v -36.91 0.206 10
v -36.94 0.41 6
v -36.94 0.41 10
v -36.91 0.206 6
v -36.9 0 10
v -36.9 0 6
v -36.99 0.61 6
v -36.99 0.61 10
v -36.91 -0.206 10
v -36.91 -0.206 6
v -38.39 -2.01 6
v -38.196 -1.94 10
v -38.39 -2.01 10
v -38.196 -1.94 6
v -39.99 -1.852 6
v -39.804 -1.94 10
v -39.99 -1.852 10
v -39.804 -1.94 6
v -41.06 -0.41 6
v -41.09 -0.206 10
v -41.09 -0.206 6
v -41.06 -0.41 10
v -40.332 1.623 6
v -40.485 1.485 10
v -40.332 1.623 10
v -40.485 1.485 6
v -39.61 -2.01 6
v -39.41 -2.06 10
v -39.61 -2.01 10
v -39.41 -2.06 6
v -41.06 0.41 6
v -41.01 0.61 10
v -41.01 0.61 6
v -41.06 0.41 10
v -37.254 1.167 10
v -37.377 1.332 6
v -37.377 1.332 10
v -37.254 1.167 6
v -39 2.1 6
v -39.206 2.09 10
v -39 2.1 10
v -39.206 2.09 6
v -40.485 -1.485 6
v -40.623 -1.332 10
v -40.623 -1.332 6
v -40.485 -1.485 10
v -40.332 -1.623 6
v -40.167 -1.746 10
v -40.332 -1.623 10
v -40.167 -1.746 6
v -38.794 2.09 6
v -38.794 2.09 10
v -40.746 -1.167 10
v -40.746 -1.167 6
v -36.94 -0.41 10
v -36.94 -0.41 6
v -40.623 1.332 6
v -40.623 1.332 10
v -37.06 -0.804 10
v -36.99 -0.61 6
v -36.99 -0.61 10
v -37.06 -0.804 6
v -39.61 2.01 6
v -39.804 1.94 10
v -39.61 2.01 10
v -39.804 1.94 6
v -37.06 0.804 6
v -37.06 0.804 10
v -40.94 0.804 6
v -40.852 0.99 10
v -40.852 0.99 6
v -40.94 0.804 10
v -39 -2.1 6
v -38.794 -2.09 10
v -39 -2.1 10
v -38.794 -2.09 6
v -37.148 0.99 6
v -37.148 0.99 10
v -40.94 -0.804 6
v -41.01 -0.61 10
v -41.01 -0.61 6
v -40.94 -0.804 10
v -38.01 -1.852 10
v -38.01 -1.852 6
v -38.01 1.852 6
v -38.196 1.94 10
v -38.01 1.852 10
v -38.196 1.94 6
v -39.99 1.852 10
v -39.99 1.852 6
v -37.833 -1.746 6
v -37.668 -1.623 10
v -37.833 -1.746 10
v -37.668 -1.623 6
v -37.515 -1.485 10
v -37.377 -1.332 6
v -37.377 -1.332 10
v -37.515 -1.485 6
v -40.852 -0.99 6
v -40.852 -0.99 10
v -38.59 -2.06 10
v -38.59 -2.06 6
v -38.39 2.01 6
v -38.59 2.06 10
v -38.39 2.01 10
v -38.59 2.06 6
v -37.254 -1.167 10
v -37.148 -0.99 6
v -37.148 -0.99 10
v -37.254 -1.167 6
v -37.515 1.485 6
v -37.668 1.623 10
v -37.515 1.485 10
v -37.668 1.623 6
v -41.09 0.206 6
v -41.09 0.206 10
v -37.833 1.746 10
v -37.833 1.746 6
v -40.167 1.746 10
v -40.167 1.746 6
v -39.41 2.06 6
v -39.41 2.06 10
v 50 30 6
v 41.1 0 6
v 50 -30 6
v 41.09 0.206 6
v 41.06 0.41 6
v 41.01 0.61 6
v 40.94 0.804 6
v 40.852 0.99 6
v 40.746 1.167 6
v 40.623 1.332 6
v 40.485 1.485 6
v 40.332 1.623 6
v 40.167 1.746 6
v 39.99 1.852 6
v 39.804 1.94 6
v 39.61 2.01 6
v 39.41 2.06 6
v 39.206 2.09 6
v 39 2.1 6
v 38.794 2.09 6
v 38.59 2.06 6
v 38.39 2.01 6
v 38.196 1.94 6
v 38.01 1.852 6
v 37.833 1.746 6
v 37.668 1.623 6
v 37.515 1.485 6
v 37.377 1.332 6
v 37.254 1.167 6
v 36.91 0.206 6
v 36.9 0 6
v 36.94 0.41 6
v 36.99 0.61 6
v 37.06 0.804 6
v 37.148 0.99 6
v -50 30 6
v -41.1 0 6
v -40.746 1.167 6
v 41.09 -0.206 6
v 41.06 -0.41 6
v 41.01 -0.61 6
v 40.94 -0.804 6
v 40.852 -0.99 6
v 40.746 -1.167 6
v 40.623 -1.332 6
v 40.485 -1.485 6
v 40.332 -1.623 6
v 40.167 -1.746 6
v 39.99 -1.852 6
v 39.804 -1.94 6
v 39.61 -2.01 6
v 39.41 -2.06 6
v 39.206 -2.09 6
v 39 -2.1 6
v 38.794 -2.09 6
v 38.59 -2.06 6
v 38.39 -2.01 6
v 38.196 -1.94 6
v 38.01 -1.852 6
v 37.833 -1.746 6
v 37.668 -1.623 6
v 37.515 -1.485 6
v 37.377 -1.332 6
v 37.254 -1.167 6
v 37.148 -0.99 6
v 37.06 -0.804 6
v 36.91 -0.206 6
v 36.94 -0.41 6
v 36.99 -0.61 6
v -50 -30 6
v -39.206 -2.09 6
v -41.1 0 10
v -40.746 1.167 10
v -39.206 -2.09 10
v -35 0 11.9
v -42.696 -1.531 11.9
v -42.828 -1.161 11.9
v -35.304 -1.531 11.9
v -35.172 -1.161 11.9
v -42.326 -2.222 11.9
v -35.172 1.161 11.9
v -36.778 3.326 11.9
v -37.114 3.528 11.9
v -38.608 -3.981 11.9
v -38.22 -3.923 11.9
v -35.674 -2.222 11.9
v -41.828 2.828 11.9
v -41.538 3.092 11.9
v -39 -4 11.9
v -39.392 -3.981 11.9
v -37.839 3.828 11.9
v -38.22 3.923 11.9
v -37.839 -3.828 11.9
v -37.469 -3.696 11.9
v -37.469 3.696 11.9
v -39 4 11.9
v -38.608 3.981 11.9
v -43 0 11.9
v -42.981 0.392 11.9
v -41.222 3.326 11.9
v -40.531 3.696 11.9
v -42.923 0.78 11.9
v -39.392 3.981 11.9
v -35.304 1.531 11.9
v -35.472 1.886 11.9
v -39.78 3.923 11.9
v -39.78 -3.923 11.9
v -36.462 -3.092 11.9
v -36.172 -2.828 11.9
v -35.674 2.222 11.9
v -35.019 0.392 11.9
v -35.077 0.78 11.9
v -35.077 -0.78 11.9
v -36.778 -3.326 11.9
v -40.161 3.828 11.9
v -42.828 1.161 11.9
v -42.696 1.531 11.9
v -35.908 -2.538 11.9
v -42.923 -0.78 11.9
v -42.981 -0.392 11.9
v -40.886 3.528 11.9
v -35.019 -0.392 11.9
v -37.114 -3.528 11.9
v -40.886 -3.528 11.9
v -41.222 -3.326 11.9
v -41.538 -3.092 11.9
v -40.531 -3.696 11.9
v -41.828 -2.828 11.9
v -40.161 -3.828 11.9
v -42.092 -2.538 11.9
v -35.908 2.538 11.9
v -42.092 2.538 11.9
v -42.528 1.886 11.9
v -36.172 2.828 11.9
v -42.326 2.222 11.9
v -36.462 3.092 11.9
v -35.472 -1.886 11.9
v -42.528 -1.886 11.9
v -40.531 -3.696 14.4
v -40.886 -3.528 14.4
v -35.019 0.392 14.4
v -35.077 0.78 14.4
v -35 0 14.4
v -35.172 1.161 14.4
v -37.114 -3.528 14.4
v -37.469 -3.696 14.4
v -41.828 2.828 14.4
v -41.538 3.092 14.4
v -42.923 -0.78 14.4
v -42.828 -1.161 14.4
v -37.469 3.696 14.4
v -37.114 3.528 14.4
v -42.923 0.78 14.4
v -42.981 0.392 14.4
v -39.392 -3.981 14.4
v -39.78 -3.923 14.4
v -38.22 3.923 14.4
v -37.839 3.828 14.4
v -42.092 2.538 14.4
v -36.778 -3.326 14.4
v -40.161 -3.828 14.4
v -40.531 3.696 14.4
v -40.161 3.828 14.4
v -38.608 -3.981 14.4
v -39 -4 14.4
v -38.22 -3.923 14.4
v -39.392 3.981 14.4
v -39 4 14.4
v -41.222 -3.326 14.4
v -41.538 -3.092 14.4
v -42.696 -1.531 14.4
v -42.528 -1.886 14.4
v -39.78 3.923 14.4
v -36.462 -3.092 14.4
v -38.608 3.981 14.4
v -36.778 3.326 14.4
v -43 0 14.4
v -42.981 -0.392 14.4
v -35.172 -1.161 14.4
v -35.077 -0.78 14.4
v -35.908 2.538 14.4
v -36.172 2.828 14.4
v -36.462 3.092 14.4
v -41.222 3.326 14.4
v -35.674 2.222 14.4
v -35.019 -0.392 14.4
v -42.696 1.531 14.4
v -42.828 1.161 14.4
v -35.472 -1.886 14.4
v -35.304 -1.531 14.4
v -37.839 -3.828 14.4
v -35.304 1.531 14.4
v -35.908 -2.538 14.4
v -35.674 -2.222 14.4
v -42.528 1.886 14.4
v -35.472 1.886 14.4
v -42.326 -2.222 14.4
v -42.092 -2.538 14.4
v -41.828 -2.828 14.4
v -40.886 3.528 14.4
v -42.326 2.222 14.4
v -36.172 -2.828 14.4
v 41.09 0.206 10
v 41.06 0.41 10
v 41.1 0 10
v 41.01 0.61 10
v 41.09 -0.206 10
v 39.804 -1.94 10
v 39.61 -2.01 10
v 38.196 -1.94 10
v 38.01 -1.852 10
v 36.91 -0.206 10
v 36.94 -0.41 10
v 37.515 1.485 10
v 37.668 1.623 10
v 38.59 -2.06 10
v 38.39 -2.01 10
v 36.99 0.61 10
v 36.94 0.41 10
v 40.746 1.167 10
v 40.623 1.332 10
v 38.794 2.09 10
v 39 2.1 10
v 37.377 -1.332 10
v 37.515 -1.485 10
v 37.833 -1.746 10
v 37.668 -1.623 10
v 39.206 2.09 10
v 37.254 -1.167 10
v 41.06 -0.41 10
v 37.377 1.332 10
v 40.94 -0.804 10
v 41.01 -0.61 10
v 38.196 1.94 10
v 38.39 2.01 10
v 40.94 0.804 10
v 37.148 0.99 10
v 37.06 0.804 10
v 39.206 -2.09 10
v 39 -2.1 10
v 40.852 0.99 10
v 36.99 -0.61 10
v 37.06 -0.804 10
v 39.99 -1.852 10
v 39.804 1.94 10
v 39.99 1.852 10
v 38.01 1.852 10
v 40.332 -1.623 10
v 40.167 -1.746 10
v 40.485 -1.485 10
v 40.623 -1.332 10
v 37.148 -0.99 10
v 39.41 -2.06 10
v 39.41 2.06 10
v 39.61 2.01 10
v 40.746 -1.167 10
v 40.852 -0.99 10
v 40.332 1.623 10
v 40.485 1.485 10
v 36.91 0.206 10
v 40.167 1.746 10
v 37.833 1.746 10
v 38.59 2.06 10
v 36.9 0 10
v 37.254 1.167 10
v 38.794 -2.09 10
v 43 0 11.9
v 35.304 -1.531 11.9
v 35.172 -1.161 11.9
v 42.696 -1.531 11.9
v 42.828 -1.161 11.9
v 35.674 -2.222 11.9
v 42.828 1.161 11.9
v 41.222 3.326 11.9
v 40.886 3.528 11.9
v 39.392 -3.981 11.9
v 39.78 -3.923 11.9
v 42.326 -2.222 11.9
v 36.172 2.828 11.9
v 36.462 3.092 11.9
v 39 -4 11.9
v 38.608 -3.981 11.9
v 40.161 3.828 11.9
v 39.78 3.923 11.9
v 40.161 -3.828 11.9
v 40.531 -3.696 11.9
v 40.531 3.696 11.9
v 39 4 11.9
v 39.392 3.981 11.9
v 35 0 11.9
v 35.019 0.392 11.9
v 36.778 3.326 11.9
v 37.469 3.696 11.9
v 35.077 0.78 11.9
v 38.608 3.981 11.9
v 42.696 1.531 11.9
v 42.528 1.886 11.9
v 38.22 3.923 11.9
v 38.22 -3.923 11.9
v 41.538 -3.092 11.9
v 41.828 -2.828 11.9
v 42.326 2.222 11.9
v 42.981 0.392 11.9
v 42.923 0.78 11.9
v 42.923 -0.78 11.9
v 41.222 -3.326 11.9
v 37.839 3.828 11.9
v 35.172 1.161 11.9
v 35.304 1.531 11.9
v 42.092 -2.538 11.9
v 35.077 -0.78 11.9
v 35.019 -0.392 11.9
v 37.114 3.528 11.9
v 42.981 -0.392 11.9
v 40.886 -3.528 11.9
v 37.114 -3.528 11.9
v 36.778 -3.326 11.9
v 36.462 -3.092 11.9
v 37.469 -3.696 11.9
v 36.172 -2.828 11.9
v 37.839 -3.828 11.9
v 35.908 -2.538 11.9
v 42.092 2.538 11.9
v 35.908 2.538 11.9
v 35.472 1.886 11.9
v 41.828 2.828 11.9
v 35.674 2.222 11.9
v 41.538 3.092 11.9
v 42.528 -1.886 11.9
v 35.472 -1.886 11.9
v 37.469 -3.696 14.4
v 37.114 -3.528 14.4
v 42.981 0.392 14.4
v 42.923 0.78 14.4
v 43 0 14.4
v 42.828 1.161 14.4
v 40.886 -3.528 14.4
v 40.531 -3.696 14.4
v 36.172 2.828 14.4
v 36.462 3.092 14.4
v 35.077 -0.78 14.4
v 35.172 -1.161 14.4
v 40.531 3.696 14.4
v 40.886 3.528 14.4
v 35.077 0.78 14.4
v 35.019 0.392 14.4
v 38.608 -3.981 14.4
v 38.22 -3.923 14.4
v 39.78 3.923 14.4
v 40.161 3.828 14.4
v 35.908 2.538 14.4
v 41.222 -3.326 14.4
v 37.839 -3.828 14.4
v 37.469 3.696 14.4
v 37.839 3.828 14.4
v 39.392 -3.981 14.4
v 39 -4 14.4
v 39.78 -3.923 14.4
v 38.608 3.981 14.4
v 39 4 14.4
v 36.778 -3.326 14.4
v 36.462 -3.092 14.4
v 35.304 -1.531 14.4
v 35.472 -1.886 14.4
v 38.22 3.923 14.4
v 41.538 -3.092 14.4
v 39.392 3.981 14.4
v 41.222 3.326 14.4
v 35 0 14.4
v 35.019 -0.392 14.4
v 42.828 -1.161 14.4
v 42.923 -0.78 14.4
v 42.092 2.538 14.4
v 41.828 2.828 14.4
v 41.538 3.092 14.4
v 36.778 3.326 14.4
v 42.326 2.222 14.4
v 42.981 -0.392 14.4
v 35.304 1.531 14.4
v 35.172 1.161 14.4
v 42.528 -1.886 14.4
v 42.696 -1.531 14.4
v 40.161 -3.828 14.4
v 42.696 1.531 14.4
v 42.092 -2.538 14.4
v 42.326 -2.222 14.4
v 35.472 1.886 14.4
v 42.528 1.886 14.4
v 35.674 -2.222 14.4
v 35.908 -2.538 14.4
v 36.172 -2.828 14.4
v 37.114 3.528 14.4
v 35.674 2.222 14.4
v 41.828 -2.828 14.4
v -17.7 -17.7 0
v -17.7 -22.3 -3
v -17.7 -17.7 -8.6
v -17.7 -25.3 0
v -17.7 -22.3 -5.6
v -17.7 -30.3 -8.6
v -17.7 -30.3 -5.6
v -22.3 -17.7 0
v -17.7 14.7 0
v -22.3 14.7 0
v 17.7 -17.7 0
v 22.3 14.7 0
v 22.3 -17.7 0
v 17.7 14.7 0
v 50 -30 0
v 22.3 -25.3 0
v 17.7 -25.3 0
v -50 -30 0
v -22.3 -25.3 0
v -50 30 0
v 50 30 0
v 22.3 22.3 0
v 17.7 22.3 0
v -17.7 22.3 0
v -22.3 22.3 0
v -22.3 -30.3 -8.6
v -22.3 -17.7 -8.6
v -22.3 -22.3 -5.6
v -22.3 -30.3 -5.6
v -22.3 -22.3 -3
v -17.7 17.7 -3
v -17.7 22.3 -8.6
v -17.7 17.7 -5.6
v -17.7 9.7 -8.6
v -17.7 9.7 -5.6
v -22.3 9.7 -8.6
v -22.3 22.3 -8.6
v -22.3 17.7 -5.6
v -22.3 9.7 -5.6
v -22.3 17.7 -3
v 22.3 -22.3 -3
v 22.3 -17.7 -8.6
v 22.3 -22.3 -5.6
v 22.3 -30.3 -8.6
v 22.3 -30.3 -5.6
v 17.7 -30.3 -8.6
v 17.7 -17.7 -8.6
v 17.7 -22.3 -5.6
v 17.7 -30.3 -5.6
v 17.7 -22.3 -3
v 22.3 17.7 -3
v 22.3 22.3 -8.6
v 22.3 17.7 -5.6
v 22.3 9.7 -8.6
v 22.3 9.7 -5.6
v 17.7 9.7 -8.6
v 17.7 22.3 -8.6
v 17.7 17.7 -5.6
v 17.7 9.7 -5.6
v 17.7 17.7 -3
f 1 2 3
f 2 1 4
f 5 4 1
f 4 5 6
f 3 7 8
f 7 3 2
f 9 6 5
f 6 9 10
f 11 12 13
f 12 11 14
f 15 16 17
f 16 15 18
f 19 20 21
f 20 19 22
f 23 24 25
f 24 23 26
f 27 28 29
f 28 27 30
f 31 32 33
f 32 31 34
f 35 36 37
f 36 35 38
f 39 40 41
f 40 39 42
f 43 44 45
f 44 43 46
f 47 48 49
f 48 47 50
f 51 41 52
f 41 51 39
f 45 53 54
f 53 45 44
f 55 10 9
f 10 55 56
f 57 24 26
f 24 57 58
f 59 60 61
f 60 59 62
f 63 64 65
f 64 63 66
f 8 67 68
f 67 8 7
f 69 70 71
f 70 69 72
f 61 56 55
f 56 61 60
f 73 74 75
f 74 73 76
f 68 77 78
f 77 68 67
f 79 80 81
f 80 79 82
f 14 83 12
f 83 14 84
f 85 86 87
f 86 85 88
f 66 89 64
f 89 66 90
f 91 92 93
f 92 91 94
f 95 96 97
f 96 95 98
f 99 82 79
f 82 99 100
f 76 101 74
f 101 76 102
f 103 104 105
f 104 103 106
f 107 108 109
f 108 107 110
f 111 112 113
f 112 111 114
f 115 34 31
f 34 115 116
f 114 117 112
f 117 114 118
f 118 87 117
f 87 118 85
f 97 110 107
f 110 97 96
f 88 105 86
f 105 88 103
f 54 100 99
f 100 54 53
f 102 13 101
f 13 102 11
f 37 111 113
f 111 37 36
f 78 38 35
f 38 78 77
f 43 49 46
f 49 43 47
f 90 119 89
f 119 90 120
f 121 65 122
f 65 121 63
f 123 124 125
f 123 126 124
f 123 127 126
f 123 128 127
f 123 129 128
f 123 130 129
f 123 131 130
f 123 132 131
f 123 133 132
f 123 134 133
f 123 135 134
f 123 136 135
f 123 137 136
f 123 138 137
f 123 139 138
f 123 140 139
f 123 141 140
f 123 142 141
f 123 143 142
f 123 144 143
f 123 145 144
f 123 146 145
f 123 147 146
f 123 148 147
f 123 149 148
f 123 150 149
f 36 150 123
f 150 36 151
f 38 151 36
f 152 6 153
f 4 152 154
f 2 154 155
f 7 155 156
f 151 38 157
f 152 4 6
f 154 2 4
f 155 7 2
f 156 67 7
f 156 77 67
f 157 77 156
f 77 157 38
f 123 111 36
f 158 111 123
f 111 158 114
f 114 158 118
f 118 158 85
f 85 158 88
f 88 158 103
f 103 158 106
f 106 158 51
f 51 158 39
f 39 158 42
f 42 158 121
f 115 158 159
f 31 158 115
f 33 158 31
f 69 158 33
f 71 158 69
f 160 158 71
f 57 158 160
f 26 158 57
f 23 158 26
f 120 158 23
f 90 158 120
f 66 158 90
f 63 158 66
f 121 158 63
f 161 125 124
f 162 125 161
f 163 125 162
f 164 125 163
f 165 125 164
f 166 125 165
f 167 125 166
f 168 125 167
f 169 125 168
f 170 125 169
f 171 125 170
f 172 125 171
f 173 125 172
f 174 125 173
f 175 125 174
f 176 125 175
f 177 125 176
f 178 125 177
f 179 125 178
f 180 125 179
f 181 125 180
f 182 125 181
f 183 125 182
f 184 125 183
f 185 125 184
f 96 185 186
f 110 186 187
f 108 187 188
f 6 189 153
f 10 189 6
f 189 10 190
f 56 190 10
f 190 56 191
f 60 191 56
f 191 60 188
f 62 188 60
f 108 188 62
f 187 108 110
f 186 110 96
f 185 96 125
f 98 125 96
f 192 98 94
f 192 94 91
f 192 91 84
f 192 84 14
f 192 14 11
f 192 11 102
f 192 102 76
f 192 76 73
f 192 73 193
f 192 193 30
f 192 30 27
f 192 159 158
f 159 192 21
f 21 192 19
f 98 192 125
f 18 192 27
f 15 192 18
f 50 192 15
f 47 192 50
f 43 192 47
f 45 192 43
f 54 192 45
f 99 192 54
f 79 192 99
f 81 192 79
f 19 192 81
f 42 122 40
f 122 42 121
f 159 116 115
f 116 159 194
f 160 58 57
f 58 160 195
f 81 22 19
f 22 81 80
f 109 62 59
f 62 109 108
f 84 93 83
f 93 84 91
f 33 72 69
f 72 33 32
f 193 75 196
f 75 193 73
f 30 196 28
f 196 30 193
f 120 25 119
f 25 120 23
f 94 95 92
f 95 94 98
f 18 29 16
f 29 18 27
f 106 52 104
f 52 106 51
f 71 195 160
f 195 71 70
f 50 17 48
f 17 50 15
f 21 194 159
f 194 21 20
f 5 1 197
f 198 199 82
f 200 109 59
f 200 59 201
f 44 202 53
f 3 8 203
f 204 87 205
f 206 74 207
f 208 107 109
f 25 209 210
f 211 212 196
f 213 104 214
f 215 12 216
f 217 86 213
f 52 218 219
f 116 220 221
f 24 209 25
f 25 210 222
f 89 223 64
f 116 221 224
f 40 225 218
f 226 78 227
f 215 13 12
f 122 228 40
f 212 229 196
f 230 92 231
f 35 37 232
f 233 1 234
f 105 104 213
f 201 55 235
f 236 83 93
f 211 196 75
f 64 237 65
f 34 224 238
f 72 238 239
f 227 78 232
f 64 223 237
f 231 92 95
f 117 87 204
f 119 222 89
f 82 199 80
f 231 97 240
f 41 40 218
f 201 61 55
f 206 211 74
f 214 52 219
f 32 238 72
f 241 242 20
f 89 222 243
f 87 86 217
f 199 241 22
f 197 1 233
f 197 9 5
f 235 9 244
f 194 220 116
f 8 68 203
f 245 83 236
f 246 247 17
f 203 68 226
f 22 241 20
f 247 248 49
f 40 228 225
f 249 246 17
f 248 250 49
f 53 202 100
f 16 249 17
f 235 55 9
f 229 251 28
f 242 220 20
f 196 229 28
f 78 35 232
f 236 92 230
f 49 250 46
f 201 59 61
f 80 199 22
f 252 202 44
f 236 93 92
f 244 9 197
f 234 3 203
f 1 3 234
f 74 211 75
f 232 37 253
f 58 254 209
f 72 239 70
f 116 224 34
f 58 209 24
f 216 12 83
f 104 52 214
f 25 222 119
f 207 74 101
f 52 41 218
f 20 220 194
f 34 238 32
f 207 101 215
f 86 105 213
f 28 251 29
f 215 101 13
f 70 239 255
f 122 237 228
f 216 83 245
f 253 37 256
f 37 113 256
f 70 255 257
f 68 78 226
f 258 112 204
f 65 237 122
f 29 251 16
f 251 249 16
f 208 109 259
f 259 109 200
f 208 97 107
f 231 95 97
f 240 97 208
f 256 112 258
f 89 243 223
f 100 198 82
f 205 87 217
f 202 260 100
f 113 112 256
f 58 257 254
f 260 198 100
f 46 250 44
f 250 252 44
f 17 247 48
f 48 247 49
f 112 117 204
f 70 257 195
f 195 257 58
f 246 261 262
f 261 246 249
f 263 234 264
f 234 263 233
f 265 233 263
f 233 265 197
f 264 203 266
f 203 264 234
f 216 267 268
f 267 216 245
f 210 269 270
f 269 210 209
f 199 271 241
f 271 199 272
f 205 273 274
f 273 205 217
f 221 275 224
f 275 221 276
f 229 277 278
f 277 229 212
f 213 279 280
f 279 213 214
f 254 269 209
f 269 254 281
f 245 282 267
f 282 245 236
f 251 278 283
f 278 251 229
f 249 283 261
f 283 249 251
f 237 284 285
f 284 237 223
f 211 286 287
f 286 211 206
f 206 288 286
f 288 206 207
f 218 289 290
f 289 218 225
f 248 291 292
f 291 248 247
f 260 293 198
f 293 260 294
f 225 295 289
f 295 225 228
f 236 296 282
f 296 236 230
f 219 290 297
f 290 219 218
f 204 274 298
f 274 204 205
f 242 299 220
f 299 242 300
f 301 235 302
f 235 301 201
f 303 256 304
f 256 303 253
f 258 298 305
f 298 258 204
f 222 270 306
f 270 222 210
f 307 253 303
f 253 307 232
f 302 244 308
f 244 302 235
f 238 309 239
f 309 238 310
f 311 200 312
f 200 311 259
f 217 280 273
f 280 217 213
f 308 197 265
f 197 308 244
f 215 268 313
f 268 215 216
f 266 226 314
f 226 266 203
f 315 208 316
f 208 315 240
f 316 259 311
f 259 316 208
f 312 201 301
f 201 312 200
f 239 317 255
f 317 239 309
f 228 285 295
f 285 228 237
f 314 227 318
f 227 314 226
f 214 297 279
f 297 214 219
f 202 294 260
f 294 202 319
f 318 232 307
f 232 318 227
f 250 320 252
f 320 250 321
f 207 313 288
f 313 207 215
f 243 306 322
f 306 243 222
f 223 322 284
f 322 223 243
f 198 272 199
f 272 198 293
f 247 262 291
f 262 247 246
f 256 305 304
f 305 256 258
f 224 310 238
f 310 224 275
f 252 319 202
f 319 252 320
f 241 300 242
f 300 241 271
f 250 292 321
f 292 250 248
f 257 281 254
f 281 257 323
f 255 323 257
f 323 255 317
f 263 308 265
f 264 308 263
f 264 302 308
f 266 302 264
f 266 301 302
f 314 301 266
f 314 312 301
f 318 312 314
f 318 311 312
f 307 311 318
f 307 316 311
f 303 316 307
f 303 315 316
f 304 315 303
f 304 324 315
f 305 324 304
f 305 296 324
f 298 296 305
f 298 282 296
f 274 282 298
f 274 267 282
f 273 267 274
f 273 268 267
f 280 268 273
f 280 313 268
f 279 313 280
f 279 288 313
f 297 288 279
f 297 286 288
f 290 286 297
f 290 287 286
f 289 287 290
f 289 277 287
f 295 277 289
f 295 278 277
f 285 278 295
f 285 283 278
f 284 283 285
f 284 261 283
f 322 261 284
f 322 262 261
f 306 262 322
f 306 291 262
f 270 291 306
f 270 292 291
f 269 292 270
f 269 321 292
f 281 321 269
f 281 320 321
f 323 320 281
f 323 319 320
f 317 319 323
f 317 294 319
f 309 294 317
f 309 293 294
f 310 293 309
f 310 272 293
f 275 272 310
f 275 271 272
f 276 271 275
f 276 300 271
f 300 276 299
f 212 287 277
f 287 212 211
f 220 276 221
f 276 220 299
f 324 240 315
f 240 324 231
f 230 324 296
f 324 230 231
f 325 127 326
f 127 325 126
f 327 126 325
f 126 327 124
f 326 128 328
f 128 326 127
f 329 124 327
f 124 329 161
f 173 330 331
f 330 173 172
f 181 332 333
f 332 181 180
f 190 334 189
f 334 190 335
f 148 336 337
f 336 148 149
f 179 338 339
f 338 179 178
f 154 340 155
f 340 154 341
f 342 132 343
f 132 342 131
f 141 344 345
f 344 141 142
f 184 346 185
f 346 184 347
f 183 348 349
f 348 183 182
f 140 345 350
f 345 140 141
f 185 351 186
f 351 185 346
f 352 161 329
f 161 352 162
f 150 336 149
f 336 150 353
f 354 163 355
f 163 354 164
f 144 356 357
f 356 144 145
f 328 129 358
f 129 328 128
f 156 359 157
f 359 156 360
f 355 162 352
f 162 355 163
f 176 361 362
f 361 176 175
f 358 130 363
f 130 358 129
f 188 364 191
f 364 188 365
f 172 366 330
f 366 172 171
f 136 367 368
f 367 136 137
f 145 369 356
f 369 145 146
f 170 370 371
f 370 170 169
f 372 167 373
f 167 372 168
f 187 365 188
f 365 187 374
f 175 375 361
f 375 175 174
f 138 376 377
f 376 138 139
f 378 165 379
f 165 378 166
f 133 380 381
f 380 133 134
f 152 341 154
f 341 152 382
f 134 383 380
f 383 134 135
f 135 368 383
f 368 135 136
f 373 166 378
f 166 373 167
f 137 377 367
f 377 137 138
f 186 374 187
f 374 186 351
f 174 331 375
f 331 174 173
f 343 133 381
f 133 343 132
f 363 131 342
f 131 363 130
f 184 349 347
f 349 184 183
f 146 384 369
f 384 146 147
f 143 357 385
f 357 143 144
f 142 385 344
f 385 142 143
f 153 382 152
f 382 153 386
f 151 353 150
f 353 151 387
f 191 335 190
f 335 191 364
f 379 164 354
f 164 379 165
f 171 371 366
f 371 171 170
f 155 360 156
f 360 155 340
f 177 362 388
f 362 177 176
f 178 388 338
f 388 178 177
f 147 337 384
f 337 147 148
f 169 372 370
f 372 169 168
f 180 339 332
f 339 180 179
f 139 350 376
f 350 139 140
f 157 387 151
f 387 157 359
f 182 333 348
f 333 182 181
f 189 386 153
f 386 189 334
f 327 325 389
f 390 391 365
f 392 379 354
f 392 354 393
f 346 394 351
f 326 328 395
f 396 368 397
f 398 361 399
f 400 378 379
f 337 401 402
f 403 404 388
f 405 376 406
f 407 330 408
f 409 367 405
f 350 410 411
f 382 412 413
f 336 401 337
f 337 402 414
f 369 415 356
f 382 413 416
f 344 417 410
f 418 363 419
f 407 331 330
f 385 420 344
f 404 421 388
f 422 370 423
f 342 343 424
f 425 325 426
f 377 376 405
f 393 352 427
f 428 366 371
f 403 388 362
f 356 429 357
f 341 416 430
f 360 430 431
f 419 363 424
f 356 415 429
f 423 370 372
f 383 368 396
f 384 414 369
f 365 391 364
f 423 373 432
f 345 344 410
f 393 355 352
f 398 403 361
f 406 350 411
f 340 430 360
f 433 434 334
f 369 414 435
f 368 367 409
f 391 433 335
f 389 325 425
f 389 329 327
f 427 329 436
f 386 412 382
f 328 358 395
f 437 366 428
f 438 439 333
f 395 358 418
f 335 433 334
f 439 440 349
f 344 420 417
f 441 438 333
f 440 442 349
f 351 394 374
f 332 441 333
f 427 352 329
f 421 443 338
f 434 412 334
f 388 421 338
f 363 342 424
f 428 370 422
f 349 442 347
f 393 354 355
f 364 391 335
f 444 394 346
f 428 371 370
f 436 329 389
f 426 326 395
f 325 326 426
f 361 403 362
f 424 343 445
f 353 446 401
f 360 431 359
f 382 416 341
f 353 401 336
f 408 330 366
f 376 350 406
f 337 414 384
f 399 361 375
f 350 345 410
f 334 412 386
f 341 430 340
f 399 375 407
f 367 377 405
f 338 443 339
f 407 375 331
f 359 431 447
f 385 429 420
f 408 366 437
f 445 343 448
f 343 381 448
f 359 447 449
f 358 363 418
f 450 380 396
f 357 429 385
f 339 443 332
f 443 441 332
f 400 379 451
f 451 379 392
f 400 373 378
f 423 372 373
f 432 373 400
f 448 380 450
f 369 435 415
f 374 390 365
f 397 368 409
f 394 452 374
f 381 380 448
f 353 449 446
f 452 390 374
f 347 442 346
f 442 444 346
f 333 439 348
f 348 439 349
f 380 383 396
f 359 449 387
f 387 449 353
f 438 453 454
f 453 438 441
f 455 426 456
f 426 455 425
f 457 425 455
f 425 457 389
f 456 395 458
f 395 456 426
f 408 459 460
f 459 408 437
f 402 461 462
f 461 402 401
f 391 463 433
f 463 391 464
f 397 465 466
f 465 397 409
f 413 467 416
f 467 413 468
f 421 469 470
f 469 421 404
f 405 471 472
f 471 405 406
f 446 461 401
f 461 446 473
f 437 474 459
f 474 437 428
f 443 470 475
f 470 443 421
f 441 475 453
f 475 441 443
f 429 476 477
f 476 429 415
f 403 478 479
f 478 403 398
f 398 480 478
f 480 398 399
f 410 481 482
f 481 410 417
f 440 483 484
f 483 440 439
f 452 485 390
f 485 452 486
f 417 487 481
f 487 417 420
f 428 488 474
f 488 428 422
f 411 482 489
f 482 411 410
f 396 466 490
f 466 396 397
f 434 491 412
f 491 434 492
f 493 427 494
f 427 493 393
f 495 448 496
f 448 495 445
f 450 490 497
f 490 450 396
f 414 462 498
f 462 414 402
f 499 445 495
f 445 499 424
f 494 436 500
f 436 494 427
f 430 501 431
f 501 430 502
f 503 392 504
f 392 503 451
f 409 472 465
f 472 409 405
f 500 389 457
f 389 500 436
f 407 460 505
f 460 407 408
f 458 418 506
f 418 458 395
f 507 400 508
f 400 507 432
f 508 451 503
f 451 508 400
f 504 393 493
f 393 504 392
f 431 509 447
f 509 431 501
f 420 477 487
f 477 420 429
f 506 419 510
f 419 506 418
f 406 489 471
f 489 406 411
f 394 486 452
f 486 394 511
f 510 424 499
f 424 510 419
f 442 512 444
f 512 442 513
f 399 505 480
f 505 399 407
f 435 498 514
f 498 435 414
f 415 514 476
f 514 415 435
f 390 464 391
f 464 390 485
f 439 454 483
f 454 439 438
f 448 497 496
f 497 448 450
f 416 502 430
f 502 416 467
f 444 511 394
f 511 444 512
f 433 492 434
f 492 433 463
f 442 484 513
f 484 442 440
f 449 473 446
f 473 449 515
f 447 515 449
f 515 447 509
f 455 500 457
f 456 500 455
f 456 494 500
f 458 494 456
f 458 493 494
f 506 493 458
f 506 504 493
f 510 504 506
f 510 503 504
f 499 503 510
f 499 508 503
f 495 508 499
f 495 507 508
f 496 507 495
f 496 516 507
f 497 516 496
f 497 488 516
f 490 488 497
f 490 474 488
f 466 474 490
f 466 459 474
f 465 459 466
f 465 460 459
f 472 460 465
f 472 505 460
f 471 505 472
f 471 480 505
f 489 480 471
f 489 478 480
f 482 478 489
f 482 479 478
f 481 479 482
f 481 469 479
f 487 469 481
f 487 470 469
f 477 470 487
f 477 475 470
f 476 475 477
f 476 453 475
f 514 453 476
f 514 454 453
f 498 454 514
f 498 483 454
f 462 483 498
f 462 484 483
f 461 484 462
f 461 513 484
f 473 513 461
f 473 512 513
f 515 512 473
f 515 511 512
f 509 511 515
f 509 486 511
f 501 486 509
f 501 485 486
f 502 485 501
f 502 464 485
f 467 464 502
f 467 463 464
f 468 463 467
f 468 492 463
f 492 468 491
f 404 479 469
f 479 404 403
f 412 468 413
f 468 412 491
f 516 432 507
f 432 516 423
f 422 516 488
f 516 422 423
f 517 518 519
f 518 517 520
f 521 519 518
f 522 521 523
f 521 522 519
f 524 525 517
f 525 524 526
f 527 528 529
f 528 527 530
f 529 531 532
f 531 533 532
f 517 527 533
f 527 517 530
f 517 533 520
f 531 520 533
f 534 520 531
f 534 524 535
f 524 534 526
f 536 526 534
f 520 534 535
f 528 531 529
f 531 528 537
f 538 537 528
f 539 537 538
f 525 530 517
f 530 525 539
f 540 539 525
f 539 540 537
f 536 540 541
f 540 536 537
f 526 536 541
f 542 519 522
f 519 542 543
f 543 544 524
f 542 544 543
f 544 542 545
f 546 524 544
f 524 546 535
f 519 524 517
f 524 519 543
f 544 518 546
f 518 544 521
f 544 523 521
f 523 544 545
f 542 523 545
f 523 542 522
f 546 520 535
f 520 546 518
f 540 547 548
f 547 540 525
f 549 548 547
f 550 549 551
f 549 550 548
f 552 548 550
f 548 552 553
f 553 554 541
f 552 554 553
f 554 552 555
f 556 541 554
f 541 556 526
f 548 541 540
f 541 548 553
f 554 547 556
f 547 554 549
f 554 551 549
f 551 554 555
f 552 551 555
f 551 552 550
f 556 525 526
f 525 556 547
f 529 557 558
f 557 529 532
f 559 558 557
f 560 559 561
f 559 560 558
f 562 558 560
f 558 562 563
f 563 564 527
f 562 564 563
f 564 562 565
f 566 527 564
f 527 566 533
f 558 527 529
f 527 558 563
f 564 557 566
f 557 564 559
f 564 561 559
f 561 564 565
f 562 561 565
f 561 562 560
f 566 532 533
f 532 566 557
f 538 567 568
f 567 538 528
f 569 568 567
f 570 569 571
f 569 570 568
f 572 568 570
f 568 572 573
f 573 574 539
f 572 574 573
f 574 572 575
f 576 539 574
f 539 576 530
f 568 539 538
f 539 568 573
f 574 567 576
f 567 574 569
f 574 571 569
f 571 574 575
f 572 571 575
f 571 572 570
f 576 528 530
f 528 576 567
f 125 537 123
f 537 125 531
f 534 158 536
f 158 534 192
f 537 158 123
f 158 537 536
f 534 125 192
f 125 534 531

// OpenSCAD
// ============================================================
// Vægplade til lampe med nøglehuls-ophæng ("omvendt lollipop")
// Monteres på IKEA SKÅDIS pegboard med indbyggede kroge på bagsiden.
//
// Forsiden har 2 "skruehoveder" (paddehatte-tappe) med 78 mm
// center-center, som lampens nøglehulsudskæringer hænges på.
//
// Alle mål i mm. Justér parametrene herunder efter din lampe:
//  - peg_shaft_d skal være mindre end den smalle del af nøglehullet
//  - peg_head_d skal være mindre end det store hul, men større end slidsen
//  - peg_shaft_l skal være lidt større end tykkelsen på lampens plade
//
// Print: Stil pladen lodret på underkanten (som den hænger).
// Slå supports til – der skal kun support under krogenes nedadvendte
// læber. Brim anbefales.
// ============================================================

// ---------- Plade ----------
plate_w = 100;    // bredde
plate_h = 60;     // højde
plate_t = 6;      // tykkelse

// ---------- "Skruehoveder" (nøglehulstappe) ----------
peg_cc      = 78;   // center-center afstand
peg_shaft_d = 4.2;  // halsens diameter (skal passe i nøglehullets slids)
peg_shaft_l = 4.0;  // frit stykke bag hovedet (plads til lampens plade)
peg_head_d  = 8.0;  // hovedets diameter (skal passe i nøglehullets store hul)
peg_head_t  = 2.5;  // hovedets tykkelse

// ---------- SKÅDIS-kroge (bagside) ----------
// SKÅDIS: huller 5 x 15 mm i 40 mm grid, pladetykkelse ca. 5,1 mm
skadis_pitch   = 40;    // hulafstand
skadis_board_t = 5.2;   // pegboardets tykkelse
hook_w         = 4.6;   // krogbredde (hullet er 5 mm)
hook_h         = 4.6;   // armens højde
hook_clear     = 0.4;   // luft bag boardet
hook_lip_l     = 8;     // læbens længde nedad bag boardet
hook_lip_t     = 3;     // læbens tykkelse
gusset         = 3;     // 45-graders støttekile under armen

$fn = 64;

hook_reach = skadis_board_t + hook_clear + hook_lip_t; // arm-længde bag pladen

module peg() {
    // hals + 45-graders overgang + fladt hoved (som et skruehoved)
    cylinder(d = peg_shaft_d, h = peg_shaft_l);
    translate([0, 0, peg_shaft_l])
        cylinder(d1 = peg_shaft_d, d2 = peg_head_d,
                 h = (peg_head_d - peg_shaft_d) / 2);
    translate([0, 0, peg_shaft_l + (peg_head_d - peg_shaft_d) / 2])
        cylinder(d = peg_head_d, h = peg_head_t);
}

module skadis_hook() {
    // Arm gennem hullet, læbe nedad bag boardet, kile under armen.
    // Origo = hulcenter på pladens bagside (z=0 er bagsiden, -z bagud).
    translate([-hook_w/2, -hook_h/2, -hook_reach])
        cube([hook_w, hook_h, hook_reach]);                 // arm
    translate([-hook_w/2, -hook_h/2 - hook_lip_l, -hook_reach])
        cube([hook_w, hook_lip_l, hook_lip_t]);             // læbe
    translate([-hook_w/2, 0, 0])
        rotate([0, 90, 0])                                   // kile (45 gr.)
            linear_extrude(height = hook_w)
                polygon([[0, -hook_h/2],
                         [gusset, -hook_h/2],
                         [0, -hook_h/2 - gusset]]);
}

// ---------- Samlet model ----------
// z=0 er pladens bagside, forsiden vender mod +z.
union() {
    translate([-plate_w/2, -plate_h/2, 0])
        cube([plate_w, plate_h, plate_t]);

    // Tappe på forsiden, 78 mm cc, lodret centreret
    for (x = [-peg_cc/2, peg_cc/2])
        translate([x, 0, plate_t])
            peg();

    // 4 SKÅDIS-kroge i 40 mm grid på bagsiden
    for (x = [-skadis_pitch/2, skadis_pitch/2],
         y = [-skadis_pitch/2, skadis_pitch/2])
        translate([x, y, 0])
            skadis_hook();
}
